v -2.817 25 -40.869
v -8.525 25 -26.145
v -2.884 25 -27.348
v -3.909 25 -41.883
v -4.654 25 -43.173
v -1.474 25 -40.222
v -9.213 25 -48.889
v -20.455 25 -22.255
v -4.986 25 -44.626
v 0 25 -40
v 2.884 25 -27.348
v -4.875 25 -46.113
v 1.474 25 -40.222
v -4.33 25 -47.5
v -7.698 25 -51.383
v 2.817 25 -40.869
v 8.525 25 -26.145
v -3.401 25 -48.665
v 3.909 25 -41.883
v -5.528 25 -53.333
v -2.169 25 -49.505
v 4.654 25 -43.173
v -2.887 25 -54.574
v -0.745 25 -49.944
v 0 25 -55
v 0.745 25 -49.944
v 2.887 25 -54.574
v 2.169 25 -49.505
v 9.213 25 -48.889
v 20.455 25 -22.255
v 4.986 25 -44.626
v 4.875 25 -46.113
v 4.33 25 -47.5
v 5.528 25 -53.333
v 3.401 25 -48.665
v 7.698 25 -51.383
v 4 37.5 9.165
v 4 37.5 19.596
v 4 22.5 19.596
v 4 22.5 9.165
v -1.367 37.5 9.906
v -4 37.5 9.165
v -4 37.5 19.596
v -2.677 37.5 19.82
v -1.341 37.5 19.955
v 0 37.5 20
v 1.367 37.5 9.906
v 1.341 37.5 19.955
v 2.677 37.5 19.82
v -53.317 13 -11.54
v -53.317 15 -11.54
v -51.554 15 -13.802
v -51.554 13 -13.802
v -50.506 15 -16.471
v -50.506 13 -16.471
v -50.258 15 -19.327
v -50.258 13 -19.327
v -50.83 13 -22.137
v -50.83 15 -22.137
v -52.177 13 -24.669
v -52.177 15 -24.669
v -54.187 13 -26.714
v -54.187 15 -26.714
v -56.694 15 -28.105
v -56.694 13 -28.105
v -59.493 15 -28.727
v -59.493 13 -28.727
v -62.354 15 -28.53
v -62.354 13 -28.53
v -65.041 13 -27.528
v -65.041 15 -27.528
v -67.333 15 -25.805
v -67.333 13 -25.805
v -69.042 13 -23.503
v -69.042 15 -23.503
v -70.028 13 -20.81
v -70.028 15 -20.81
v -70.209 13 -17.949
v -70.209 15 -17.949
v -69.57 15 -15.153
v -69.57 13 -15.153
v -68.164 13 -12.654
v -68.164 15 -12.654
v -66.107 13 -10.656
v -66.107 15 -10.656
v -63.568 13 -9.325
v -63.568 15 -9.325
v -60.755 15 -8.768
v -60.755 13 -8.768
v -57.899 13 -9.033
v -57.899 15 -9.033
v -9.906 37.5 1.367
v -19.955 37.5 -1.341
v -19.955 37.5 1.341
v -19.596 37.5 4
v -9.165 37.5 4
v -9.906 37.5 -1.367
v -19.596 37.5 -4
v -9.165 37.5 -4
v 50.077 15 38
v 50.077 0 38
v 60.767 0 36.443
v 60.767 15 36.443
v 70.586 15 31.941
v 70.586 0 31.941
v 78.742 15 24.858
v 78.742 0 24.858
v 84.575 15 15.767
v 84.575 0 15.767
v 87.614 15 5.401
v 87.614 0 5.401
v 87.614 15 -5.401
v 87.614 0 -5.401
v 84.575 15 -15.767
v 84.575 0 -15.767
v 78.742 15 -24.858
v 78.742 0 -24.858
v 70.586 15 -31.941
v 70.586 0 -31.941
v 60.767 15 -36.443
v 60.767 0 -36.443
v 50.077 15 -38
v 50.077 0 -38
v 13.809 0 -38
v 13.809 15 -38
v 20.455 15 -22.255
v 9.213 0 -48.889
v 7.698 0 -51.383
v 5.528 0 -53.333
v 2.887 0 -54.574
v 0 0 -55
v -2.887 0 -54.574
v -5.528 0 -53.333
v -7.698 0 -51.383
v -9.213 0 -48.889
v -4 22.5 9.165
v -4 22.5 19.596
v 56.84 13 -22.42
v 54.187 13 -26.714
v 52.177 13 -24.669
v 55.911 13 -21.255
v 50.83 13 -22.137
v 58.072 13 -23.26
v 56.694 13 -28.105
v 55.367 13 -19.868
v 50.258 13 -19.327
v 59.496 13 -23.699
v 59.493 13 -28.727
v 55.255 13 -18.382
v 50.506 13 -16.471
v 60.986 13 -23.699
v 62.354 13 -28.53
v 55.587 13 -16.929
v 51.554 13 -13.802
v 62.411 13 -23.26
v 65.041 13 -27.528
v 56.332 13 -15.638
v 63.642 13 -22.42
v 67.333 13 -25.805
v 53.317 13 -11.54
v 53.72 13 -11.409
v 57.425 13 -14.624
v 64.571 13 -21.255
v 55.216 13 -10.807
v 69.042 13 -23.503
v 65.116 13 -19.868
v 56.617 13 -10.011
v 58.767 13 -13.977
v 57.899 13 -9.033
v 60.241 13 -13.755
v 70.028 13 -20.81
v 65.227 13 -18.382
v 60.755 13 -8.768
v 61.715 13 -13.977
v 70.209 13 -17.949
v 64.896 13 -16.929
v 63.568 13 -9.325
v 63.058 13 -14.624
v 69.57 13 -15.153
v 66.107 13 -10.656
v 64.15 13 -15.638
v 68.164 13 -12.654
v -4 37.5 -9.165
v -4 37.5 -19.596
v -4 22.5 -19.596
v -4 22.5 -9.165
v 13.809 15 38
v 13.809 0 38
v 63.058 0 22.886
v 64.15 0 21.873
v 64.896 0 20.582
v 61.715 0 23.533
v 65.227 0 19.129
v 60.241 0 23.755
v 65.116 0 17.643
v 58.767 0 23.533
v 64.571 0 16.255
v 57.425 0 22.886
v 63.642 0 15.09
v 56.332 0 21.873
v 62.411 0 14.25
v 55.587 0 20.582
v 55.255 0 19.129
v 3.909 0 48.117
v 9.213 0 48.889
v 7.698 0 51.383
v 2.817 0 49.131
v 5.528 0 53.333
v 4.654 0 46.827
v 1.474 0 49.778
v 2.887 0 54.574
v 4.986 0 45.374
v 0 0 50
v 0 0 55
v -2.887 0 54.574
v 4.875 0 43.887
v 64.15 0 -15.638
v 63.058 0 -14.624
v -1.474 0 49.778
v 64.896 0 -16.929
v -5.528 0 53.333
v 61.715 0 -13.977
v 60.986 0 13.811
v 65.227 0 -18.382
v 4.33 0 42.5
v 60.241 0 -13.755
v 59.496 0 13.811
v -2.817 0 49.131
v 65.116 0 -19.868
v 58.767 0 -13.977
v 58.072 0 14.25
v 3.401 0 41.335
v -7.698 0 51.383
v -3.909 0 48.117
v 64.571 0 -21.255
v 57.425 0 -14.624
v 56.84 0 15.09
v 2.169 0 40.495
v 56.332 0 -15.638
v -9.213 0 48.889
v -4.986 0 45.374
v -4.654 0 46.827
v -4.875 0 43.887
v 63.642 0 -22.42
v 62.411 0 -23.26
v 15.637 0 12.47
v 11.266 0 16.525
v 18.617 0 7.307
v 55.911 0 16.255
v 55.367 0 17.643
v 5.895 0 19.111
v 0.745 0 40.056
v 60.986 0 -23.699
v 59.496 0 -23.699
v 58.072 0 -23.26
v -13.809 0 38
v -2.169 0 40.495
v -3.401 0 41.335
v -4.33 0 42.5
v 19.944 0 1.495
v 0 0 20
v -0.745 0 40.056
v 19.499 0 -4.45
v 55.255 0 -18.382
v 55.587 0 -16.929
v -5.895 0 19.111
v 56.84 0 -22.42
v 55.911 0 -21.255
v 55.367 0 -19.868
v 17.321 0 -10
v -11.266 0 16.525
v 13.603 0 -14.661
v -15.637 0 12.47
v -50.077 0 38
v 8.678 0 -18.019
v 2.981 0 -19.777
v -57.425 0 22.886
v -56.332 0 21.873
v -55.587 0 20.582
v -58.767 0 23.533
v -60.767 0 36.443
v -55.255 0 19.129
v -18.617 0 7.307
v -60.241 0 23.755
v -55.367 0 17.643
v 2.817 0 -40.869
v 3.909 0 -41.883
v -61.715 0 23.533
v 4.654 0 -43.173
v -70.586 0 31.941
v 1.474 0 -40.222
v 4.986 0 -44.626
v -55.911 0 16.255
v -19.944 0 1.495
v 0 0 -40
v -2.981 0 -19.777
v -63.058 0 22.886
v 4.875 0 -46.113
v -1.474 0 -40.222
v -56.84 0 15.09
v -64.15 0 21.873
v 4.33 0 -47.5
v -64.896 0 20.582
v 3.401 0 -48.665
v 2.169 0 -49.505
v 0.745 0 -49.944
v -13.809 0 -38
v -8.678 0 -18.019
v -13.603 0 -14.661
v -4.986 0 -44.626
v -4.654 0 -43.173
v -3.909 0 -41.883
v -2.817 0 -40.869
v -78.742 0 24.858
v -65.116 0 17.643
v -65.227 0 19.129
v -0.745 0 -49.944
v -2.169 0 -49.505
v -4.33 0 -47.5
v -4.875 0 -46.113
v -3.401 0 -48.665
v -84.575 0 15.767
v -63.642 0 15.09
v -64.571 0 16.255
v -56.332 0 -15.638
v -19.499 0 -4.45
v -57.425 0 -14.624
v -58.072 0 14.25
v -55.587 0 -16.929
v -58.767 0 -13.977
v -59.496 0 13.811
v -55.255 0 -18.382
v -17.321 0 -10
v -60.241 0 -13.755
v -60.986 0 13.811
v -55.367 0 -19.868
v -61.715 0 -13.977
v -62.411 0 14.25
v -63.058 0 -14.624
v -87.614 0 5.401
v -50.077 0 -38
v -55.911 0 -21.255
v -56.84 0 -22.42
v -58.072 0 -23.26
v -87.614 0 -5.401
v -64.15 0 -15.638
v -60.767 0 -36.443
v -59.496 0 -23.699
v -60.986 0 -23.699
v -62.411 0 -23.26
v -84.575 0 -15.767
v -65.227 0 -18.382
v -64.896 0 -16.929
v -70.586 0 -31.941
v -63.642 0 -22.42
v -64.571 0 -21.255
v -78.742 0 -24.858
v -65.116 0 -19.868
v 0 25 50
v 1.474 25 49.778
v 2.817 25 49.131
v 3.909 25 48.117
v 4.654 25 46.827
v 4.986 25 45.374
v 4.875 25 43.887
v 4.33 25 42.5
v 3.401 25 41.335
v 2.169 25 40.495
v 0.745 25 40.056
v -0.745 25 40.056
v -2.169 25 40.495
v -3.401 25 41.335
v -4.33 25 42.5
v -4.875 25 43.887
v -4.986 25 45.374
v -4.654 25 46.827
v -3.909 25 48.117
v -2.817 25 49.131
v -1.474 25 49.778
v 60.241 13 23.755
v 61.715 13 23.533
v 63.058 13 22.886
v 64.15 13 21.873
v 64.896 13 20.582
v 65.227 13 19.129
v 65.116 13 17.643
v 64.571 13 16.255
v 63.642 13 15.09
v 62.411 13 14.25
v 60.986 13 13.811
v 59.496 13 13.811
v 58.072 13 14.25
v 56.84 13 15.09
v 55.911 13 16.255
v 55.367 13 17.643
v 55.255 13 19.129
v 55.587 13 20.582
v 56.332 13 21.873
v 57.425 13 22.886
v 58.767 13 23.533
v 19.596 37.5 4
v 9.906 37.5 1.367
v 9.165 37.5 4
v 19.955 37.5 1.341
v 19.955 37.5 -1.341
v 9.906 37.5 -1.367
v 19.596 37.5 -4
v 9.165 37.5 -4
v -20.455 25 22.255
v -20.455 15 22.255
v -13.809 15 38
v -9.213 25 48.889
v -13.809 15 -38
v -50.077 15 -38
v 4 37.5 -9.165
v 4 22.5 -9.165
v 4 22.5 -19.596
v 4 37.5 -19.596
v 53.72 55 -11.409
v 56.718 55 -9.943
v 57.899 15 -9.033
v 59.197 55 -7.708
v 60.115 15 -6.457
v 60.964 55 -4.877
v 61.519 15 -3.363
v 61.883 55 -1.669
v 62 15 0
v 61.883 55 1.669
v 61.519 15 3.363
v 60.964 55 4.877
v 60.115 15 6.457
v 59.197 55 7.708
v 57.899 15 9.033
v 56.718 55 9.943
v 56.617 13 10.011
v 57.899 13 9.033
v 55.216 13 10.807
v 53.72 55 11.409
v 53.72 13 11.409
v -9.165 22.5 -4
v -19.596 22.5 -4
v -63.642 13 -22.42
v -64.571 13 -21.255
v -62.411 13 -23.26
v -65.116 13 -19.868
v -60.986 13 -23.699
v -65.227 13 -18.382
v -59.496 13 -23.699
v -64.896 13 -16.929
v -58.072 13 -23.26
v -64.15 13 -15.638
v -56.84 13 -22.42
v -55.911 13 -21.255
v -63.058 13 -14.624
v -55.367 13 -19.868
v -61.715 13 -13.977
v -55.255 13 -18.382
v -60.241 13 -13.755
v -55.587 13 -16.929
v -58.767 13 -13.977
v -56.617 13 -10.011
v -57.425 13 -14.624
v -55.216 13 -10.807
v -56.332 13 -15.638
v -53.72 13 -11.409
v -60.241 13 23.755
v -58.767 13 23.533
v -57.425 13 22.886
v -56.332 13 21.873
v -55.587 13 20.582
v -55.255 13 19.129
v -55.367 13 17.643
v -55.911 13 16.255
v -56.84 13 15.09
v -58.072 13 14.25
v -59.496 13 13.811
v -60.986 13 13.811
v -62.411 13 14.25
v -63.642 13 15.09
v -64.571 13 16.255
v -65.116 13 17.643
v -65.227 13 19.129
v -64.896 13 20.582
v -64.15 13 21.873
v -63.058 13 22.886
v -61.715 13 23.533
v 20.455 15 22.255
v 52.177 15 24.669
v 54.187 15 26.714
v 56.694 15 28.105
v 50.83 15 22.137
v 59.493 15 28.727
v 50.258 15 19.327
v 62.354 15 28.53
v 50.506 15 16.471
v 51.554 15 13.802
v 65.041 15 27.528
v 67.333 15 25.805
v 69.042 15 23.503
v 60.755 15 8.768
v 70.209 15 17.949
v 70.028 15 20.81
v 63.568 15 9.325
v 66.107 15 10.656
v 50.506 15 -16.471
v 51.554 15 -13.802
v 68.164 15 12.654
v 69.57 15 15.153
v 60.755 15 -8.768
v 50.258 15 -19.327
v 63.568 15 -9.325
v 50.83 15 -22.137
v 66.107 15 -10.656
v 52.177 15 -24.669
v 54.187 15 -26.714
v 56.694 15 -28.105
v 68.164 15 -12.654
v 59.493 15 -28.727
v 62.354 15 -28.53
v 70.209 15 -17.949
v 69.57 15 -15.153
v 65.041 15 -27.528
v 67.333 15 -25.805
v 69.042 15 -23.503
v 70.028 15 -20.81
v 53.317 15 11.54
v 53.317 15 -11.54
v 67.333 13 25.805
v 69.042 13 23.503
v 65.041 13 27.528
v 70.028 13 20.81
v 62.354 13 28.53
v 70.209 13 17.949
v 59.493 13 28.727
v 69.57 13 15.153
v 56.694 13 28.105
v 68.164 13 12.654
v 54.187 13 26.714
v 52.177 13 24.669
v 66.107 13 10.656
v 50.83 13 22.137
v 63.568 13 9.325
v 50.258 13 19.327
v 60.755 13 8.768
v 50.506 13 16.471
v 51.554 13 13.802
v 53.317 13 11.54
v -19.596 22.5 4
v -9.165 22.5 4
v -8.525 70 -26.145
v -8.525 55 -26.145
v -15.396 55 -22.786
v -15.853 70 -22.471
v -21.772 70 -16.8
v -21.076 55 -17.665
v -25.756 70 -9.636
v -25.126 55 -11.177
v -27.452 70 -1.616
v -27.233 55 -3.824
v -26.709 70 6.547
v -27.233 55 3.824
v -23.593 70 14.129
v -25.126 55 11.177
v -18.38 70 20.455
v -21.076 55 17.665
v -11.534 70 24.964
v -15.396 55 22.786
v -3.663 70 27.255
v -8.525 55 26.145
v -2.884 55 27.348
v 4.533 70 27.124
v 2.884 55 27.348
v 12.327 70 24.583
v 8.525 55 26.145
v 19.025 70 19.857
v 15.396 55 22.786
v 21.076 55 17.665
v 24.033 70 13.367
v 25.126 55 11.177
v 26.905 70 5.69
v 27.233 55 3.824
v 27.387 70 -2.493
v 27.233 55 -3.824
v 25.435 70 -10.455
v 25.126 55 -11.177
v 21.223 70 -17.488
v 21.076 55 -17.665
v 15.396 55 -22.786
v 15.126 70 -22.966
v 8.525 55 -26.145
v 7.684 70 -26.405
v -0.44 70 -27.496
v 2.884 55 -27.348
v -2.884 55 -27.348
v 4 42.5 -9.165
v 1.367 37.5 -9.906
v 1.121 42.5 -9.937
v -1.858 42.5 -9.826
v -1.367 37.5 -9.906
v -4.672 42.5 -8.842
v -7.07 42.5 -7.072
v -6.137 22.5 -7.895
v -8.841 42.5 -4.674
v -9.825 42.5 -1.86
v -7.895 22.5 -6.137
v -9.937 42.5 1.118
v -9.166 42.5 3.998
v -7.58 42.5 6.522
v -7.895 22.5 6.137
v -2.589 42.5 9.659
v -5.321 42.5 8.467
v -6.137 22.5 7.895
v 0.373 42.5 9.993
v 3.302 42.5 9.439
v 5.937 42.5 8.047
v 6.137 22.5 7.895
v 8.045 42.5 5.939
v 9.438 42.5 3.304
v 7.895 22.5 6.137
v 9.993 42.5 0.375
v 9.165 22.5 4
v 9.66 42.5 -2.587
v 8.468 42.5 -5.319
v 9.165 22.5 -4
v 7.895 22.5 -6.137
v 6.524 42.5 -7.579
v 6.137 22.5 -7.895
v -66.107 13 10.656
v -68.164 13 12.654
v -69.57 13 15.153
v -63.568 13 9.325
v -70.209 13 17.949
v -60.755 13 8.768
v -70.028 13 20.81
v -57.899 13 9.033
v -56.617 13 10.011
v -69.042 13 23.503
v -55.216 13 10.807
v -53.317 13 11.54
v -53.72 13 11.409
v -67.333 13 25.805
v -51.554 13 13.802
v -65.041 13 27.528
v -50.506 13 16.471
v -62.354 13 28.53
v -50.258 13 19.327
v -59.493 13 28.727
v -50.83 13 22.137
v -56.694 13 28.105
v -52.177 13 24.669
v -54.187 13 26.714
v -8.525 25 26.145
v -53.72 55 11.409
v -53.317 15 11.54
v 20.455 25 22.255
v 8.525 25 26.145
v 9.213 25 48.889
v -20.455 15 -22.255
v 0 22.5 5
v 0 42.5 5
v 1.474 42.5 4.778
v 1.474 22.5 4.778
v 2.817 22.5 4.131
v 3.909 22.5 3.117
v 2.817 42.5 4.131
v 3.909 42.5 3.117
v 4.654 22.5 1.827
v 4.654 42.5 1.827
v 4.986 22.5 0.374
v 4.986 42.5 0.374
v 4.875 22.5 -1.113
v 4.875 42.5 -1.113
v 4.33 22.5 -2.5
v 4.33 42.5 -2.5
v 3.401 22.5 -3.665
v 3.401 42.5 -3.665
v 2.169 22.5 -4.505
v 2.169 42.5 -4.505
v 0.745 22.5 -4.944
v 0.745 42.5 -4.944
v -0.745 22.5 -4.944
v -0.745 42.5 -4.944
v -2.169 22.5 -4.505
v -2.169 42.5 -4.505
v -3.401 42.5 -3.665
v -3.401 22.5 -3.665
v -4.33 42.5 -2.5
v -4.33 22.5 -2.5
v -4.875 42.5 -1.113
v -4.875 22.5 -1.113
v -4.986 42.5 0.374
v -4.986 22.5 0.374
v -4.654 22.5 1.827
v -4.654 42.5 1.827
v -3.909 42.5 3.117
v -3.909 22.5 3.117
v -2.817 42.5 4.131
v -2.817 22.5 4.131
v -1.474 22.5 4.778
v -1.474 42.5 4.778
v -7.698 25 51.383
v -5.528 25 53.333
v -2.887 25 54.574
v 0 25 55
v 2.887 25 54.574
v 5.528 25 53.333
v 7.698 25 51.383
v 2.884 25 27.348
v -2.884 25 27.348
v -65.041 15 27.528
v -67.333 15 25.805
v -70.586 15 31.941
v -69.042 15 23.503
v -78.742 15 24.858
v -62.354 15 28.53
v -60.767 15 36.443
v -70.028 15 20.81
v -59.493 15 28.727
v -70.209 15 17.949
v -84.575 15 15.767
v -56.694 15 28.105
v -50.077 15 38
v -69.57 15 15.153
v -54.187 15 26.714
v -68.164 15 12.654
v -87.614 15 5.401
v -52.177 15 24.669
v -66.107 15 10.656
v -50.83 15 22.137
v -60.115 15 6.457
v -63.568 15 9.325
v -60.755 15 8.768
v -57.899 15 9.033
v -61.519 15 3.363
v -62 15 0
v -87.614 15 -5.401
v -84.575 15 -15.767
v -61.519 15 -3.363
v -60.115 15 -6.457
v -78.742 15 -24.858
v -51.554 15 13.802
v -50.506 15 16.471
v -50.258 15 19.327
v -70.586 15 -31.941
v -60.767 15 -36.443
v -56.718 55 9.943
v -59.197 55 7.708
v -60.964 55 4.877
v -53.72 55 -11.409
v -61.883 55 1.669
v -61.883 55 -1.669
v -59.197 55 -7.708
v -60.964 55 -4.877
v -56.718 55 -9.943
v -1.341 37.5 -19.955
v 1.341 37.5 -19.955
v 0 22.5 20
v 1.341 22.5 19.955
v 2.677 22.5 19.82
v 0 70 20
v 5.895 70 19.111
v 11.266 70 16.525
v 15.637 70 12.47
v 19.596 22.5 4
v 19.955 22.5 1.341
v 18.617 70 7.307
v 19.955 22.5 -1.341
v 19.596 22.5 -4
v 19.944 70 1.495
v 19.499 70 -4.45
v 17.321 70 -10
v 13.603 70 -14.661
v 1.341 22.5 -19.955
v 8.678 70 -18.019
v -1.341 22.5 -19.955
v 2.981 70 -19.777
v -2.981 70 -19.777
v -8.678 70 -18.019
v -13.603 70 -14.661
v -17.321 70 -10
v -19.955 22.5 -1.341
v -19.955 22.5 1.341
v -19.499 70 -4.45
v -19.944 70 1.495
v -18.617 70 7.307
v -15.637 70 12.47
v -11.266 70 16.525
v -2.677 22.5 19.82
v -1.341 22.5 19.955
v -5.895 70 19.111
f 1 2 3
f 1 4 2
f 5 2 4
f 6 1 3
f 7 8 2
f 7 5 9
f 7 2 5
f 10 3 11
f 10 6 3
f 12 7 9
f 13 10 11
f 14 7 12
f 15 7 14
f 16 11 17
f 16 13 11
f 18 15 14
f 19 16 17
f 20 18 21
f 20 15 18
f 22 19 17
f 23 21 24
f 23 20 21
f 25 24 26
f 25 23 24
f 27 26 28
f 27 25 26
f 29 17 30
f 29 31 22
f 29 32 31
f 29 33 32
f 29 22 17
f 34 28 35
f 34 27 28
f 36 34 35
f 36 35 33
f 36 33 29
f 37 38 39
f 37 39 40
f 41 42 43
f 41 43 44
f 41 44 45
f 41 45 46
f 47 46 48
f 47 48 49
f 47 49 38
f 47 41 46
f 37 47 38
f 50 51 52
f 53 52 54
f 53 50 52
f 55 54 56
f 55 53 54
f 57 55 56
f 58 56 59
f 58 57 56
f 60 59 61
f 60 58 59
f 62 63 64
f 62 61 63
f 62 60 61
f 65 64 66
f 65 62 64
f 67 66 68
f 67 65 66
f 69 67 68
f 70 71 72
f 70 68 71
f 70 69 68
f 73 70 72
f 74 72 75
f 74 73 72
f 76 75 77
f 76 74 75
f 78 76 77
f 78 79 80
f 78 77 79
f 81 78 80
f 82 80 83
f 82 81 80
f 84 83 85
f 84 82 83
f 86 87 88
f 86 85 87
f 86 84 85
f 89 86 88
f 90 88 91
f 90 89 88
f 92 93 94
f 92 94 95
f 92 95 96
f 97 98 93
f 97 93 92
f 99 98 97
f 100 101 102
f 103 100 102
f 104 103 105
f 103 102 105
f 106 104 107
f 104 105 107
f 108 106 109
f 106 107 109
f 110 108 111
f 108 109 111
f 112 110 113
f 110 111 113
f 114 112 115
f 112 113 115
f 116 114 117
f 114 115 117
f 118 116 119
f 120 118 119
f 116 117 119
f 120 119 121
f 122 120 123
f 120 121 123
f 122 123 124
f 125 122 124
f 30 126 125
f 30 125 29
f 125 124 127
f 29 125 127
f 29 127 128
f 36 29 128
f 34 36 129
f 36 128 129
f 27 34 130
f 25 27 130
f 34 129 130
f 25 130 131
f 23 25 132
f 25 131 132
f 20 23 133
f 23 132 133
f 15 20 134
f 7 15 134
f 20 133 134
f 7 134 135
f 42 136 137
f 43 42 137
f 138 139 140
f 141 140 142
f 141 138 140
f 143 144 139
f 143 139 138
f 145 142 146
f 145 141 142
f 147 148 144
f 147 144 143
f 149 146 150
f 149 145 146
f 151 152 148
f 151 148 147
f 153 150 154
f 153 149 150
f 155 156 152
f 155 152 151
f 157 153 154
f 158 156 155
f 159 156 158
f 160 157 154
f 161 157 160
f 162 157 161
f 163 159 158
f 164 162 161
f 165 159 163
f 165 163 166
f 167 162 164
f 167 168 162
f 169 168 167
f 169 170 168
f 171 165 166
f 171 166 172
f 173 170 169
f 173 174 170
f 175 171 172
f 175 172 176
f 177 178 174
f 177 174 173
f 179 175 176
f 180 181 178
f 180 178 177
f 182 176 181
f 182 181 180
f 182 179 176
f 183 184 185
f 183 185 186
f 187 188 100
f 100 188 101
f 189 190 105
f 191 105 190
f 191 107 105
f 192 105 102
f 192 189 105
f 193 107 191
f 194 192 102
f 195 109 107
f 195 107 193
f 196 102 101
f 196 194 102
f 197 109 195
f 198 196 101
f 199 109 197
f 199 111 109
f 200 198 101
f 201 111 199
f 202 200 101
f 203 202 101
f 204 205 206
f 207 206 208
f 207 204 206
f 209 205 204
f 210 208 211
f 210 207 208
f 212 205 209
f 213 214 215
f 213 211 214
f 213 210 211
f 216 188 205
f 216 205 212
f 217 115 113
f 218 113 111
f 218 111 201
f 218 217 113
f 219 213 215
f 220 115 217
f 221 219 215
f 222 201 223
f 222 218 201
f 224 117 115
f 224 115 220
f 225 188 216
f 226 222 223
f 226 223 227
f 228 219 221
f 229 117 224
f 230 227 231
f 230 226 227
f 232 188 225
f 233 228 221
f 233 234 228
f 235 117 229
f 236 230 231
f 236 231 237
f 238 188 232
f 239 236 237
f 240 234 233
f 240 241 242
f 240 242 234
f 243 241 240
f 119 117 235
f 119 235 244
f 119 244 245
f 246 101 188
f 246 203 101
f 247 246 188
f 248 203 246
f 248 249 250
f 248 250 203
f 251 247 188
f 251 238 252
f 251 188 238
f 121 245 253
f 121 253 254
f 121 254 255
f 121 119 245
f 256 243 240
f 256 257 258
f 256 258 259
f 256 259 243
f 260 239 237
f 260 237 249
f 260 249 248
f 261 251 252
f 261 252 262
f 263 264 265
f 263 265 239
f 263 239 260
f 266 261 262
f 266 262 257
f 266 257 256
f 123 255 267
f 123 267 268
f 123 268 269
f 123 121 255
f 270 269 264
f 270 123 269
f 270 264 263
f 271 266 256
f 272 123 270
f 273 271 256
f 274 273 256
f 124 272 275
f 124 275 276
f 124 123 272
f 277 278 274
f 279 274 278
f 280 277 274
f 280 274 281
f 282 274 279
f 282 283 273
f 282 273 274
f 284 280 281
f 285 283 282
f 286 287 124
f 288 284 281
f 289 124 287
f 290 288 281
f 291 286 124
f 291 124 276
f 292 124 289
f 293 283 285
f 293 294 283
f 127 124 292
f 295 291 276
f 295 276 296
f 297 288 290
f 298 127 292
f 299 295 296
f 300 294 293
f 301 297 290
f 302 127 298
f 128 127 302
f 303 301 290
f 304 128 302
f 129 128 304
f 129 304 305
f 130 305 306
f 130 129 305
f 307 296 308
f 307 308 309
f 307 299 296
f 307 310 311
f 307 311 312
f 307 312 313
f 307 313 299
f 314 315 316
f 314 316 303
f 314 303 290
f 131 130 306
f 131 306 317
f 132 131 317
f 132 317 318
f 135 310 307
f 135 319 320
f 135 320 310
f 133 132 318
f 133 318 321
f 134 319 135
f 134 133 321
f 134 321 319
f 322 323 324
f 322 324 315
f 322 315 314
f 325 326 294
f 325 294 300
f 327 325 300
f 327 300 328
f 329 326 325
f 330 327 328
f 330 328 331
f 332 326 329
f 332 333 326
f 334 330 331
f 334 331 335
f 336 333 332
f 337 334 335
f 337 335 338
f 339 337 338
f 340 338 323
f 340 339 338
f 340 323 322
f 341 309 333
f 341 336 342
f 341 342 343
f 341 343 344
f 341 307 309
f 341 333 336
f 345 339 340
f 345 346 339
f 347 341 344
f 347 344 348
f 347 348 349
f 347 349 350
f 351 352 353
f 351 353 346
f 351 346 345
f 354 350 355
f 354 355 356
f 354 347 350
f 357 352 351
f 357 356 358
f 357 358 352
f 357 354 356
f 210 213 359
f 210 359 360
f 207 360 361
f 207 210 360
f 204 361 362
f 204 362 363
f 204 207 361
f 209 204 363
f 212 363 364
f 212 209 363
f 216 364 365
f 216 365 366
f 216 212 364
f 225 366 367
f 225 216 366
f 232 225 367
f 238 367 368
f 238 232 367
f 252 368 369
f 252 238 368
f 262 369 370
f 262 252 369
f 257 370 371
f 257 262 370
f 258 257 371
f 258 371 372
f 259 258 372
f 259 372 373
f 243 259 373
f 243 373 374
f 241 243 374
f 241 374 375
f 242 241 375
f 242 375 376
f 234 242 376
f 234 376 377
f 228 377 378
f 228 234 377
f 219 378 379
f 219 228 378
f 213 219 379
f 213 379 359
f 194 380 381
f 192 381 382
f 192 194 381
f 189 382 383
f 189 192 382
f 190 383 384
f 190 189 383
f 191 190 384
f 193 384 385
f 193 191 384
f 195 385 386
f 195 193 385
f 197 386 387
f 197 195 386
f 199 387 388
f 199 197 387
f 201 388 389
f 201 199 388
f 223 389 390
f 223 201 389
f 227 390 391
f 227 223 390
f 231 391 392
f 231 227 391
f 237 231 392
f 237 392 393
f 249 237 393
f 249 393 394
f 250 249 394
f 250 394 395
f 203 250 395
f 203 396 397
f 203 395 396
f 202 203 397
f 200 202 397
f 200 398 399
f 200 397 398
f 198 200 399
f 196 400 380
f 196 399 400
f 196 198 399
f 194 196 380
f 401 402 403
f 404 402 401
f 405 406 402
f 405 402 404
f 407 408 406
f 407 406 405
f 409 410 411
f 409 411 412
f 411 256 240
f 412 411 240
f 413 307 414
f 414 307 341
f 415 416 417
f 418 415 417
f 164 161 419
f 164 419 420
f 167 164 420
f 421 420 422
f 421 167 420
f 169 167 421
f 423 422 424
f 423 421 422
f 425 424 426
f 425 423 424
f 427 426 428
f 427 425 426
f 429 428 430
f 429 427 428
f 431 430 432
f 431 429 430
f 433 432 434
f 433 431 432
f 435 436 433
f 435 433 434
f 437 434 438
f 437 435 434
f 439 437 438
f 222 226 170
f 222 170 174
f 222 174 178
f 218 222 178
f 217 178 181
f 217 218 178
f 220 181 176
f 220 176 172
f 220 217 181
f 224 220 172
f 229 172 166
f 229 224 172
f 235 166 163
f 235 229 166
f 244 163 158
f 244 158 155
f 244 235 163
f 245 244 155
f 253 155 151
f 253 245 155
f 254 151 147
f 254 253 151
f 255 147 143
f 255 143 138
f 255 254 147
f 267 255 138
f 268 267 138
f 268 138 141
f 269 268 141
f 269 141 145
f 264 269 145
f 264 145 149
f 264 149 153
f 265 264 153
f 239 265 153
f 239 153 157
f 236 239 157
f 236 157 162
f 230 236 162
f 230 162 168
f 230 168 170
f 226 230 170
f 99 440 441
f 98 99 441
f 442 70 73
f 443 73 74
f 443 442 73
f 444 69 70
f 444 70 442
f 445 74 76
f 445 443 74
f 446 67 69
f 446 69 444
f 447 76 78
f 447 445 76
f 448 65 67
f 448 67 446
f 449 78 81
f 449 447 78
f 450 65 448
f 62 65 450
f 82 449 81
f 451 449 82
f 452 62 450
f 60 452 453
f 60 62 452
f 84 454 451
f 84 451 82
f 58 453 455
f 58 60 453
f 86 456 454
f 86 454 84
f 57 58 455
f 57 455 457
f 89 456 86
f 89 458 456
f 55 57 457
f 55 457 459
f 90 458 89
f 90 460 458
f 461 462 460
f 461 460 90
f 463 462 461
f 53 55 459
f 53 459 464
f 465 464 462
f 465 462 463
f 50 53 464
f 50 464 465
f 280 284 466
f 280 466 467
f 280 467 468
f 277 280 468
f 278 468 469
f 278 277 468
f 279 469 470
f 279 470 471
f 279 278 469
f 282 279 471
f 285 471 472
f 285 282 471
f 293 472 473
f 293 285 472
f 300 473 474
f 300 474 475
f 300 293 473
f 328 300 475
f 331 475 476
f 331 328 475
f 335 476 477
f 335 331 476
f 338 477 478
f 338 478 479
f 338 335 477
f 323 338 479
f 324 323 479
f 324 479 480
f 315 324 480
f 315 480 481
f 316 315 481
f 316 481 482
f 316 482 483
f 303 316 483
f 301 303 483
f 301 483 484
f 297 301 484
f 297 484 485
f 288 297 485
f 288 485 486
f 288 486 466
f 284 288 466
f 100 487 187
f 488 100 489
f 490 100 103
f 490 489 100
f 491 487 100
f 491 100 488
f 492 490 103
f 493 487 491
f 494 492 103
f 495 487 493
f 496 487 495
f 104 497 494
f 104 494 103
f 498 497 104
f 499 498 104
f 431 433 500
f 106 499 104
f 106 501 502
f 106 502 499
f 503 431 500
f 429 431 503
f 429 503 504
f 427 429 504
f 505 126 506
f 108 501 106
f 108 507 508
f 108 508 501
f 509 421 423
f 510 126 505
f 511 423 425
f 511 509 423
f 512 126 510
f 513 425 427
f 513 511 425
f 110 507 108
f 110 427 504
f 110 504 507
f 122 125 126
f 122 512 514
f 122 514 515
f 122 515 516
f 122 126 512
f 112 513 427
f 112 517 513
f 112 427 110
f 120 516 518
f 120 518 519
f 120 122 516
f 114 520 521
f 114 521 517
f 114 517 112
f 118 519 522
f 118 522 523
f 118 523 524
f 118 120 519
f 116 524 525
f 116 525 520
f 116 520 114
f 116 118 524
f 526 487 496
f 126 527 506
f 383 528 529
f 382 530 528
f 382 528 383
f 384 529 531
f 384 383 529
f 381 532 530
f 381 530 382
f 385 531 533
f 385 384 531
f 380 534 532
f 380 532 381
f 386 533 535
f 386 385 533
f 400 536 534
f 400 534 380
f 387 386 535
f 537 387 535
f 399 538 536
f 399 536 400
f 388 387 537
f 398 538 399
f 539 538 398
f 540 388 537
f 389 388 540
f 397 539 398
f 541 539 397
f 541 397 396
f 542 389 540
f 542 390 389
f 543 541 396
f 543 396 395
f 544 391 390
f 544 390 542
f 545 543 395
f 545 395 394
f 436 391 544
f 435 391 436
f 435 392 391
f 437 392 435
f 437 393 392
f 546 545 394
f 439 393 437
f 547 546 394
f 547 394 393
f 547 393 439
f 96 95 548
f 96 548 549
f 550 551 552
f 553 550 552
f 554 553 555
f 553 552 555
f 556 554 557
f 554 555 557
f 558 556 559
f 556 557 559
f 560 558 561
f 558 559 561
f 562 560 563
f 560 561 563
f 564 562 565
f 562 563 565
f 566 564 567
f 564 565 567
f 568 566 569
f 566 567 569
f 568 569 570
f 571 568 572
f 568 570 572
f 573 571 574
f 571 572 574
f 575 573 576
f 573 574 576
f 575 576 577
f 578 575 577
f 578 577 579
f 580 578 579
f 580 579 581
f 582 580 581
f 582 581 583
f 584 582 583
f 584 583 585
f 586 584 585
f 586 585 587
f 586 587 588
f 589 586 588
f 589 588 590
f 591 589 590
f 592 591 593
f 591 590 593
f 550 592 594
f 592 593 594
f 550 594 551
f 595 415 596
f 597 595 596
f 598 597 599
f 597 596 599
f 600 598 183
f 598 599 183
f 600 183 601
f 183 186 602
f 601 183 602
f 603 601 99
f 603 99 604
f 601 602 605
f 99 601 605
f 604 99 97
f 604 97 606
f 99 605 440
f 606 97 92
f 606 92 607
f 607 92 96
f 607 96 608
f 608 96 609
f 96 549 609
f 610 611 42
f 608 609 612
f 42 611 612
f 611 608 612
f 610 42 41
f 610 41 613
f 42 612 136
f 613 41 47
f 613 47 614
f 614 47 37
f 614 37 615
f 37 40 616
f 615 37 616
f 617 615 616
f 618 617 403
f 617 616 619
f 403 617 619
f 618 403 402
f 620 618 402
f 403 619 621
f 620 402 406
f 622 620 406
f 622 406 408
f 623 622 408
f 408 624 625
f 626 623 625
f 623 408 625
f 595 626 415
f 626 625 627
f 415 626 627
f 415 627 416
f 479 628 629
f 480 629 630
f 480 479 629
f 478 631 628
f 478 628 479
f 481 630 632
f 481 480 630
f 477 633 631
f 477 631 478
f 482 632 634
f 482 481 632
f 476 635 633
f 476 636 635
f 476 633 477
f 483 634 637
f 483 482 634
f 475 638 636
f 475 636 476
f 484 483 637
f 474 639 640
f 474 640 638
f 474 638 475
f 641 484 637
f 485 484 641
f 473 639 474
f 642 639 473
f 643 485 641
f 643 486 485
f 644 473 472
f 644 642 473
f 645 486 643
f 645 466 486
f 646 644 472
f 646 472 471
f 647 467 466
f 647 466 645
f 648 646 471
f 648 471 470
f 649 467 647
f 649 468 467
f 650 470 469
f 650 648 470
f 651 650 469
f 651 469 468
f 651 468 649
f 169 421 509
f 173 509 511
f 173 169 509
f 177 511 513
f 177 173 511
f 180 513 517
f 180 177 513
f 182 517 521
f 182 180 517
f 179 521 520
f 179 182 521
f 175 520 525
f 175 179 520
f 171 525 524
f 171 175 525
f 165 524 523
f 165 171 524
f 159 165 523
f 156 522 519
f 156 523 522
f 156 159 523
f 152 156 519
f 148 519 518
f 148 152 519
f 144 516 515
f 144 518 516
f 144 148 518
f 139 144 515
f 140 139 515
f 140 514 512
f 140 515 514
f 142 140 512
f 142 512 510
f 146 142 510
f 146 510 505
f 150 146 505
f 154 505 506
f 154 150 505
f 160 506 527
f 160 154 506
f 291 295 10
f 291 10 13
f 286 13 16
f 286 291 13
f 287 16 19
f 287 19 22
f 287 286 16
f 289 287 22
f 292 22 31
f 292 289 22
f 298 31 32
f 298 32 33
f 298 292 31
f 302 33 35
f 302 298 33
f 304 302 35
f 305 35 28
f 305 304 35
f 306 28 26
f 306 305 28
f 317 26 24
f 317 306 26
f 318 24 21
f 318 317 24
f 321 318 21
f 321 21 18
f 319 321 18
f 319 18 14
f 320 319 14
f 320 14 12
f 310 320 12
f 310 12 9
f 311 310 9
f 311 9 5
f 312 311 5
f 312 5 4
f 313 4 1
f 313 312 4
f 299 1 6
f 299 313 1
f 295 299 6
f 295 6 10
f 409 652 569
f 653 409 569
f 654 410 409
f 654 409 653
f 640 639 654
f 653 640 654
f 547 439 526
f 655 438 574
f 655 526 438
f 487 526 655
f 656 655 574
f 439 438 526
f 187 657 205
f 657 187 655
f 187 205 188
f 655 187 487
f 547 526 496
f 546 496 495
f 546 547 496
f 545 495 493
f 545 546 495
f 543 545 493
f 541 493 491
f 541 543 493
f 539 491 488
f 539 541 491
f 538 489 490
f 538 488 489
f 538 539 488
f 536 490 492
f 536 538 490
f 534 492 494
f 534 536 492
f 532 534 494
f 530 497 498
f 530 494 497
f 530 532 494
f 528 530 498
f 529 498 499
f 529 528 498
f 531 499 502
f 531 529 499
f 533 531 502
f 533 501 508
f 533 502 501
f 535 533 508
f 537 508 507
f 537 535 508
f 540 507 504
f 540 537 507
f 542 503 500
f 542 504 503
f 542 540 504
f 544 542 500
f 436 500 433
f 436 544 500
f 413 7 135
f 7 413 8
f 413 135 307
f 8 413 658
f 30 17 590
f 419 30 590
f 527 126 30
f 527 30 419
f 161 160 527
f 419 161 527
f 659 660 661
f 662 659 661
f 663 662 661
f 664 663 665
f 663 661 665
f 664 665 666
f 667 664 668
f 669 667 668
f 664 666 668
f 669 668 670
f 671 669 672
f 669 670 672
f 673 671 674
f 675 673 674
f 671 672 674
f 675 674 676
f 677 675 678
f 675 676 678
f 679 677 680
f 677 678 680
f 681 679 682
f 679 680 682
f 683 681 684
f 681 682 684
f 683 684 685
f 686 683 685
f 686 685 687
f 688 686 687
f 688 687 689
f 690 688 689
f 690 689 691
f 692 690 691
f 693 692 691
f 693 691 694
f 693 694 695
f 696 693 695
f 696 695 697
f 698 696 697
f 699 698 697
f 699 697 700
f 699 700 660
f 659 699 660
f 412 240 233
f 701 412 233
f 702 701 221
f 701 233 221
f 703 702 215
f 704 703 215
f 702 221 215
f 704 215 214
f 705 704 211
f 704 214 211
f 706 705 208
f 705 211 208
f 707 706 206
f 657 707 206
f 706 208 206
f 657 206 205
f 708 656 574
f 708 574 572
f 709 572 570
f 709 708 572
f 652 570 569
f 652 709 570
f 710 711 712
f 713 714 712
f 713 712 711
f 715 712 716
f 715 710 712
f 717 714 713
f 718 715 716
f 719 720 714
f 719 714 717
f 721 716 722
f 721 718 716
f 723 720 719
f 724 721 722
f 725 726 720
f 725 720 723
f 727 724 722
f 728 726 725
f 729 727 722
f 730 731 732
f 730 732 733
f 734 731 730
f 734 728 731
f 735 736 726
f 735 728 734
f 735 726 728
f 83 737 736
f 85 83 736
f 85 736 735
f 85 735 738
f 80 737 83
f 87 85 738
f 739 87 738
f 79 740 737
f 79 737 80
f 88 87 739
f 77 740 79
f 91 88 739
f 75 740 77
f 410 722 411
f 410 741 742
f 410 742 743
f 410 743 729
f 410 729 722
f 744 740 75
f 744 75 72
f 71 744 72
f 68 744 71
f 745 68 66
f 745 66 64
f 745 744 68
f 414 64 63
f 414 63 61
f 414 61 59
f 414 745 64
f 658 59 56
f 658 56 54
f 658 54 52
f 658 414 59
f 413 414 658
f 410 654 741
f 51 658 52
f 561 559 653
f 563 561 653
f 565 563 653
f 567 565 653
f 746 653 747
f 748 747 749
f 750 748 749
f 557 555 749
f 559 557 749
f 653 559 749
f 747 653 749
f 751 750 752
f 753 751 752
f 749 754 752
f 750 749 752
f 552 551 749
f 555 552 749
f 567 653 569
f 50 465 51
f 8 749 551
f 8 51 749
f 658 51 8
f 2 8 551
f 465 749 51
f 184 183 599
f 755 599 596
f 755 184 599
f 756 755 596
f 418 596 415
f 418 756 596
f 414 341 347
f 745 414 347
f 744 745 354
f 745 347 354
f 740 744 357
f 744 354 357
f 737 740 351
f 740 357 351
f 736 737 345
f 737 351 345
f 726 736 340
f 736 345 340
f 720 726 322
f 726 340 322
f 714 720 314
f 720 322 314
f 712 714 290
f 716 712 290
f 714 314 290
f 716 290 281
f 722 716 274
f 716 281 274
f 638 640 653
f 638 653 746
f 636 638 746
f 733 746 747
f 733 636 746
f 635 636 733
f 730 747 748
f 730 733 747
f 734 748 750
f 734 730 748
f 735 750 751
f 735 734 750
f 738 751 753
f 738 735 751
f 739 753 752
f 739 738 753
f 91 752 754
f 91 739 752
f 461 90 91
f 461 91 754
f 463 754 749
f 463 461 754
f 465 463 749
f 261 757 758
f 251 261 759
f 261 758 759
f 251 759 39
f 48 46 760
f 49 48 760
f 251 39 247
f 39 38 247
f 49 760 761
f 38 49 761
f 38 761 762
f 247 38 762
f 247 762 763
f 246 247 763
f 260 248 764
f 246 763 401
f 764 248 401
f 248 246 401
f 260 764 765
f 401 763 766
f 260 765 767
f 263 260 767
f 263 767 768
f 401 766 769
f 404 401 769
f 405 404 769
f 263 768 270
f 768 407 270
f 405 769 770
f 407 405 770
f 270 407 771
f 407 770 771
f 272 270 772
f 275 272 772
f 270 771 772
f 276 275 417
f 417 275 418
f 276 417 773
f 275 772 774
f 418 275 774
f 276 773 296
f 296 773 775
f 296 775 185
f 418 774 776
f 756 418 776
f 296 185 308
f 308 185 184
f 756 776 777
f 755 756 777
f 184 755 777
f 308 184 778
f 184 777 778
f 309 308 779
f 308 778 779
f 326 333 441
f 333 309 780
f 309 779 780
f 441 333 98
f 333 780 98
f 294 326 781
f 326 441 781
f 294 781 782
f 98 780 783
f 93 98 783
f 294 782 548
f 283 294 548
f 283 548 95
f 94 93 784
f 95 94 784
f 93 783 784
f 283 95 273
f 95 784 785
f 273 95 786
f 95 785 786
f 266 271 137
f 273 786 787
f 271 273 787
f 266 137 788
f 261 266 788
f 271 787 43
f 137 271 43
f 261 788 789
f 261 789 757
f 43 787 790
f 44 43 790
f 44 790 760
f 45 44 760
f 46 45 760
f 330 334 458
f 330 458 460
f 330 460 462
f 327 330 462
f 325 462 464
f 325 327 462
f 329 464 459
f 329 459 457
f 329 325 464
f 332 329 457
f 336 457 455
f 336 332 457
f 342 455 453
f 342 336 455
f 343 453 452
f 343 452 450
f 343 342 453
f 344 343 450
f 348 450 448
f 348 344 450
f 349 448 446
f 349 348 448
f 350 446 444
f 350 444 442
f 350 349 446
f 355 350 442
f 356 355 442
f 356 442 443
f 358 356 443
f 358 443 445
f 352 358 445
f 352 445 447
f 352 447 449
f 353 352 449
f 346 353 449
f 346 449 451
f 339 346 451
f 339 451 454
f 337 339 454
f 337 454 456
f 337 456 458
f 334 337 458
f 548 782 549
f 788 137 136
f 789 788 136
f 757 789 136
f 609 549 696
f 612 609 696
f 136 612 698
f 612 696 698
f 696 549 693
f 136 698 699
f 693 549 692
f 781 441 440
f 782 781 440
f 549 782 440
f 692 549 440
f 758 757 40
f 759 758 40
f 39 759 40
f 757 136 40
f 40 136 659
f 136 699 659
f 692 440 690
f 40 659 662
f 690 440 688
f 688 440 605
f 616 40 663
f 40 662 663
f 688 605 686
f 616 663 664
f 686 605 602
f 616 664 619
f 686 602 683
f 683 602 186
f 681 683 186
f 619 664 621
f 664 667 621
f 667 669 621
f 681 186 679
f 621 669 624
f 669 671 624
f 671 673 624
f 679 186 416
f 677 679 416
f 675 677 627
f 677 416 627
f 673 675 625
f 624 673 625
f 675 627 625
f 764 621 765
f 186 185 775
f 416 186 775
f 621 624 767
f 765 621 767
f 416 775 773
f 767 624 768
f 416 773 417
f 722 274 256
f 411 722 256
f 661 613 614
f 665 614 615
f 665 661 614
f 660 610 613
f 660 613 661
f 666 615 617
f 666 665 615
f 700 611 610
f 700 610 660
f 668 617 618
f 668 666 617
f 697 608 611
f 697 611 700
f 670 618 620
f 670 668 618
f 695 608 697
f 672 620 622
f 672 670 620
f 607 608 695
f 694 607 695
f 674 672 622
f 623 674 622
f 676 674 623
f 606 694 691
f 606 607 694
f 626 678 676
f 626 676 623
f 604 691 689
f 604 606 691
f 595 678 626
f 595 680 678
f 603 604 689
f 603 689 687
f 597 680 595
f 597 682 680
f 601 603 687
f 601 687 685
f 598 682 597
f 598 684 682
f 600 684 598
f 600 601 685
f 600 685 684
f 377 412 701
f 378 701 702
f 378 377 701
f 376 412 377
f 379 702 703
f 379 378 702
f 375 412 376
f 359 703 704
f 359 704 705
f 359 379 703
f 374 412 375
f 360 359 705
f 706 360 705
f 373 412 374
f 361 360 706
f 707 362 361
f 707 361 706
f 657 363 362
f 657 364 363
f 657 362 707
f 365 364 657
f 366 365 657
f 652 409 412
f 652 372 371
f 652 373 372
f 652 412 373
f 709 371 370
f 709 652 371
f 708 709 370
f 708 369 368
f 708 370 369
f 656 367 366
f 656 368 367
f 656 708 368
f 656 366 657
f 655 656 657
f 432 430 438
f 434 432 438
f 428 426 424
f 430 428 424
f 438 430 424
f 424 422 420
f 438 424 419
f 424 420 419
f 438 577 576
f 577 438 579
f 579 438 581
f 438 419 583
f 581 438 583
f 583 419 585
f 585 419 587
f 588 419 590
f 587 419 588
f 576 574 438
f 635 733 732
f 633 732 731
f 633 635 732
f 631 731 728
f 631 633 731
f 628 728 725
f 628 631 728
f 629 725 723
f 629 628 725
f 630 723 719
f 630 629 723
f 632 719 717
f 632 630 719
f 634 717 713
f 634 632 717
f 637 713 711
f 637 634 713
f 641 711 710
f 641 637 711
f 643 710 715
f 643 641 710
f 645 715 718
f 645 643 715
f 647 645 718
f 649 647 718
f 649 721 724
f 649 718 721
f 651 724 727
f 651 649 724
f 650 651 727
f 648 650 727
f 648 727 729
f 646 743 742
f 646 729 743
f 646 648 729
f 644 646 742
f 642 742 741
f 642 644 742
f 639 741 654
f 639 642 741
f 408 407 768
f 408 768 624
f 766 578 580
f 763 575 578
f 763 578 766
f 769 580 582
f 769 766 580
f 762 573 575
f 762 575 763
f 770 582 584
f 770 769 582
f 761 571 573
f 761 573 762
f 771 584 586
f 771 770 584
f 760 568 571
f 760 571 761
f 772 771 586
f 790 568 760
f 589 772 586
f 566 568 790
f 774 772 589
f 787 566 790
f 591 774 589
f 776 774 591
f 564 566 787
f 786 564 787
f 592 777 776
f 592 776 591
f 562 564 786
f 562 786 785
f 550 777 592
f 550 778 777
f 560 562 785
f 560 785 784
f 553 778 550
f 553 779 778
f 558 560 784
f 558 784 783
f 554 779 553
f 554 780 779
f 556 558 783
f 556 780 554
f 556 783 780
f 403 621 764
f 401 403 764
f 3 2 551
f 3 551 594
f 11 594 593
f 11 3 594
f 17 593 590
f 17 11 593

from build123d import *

# Parameters (mm, degrees)
SKETCH1_R           = 5
BOSS_EXTRUDE2_DEPTH = 15
CUT_EXTRUDE1_START  = -2
SKETCH2_R           = 10
SKETCH2_R_2         = 5
CUT_EXTRUDE1_DEPTH  = 2
BOSS_EXTRUDE3_START = -15
SKETCH3_R           = 5
BOSS_EXTRUDE3_DEPTH = 25
BOSS_EXTRUDE4_DEPTH = 55
SKETCH5_R           = 27.5
BOSS_EXTRUDE5_DEPTH = 15
SKETCH6_R           = 20
CUT_EXTRUDE2_DEPTH  = 126.175931669
EXTRUDE_THIN1_START = 22.5
EXTRUDE_THIN1_DEPTH = 15
BOSS_EXTRUDE6_START = -15
SKETCH8_R           = 10
BOSS_EXTRUDE6_DEPTH = 20
SKETCH9_R           = 5
CUT_EXTRUDE3_DEPTH  = 113.139483989


with BuildPart() as part:
    # Sketch1 → Boss-Extrude2 (new body)
    with BuildSketch(Plane(origin=(0, 0, 0), x_dir=(1, 0, 0), z_dir=(0, 1, 0))):
        with BuildLine():
            Line((-50.077388597, -38), (50.077388597, -38))
            ThreePointArc((50.077388597, -38), (88.000078802, 0), (50.077388597, 38))
            Line((50.077388597, 38), (-50.077388597, 38))
            ThreePointArc((-50.077388597, 38), (-88.000078802, 0), (-50.077388597, -38))
        make_face()
        with Locations(Location((-60.241162363, 18.755220238, 0), (0, 0, 270))):
            Circle(SKETCH1_R, mode=Mode.SUBTRACT)
        with Locations(Location((-60.241162363, -18.755220238, 0), (0, 0, 270))):
            Circle(SKETCH1_R, mode=Mode.SUBTRACT)
        with Locations(Location((60.241162363, -18.755220238, 0), (0, 0, 270))):
            Circle(SKETCH1_R, mode=Mode.SUBTRACT)
        with Locations(Location((60.241162363, 18.755220238, 0), (0, 0, 270))):
            Circle(SKETCH1_R, mode=Mode.SUBTRACT)
    extrude(amount=BOSS_EXTRUDE2_DEPTH)

    # Sketch2 → Cut-Extrude1 (cut)
    # profile 1 of 4: a face of its own
    with BuildSketch(Plane(origin=(0, 15, 0), x_dir=(1, 0, 0), z_dir=(0, 1, 0)).offset(CUT_EXTRUDE1_START)):
        with Locations(Location((-60.241162363, -18.755220238, 0), (0, 0, 270))):
            Circle(SKETCH2_R)
        with Locations(Location((-60.241162363, -18.755220238, 0), (0, 0, 270))):
            Circle(SKETCH2_R_2, mode=Mode.SUBTRACT)
    # profile 2 of 4: a face of its own
    with BuildSketch(Plane(origin=(0, 15, 0), x_dir=(1, 0, 0), z_dir=(0, 1, 0)).offset(CUT_EXTRUDE1_START)):
        with Locations(Location((-60.241162363, 18.755220238, 0), (0, 0, 270))):
            Circle(SKETCH2_R)
        with Locations(Location((-60.241162363, 18.755220238, 0), (0, 0, 270))):
            Circle(SKETCH2_R_2, mode=Mode.SUBTRACT)
    # profile 3 of 4: a face of its own
    with BuildSketch(Plane(origin=(0, 15, 0), x_dir=(1, 0, 0), z_dir=(0, 1, 0)).offset(CUT_EXTRUDE1_START)):
        with Locations(Location((60.241162363, 18.755220238, 0), (0, 0, 270))):
            Circle(SKETCH2_R)
        with Locations(Location((60.241162363, 18.755220238, 0), (0, 0, 270))):
            Circle(SKETCH2_R_2, mode=Mode.SUBTRACT)
    # profile 4 of 4: a face of its own
    with BuildSketch(Plane(origin=(0, 15, 0), x_dir=(1, 0, 0), z_dir=(0, 1, 0)).offset(CUT_EXTRUDE1_START)):
        with Locations(Location((60.241162363, -18.755220238, 0), (0, 0, 90))):
            Circle(SKETCH2_R)
    extrude(amount=CUT_EXTRUDE1_DEPTH, mode=Mode.SUBTRACT)

    # Sketch3 → Boss-Extrude3 (add)
    with BuildSketch(Plane(origin=(0, 15, 0), x_dir=(1, 0, 0), z_dir=(0, 1, 0)).offset(BOSS_EXTRUDE3_START)):
        with BuildLine():
            Line((-9.21284664, 48.888888889), (-25.33532826, 10.694444444))
            ThreePointArc((-25.33532826, 10.694444444), (-27.5, 0), (-25.33532826, -10.694444444))
            Line((-25.33532826, -10.694444444), (-9.21284664, -48.888888889))
            ThreePointArc((-9.21284664, -48.888888889), (0, -55), (9.21284664, -48.888888889))
            Line((9.21284664, -48.888888889), (25.33532826, -10.694444444))
            ThreePointArc((25.33532826, -10.694444444), (27.5, 0), (25.33532826, 10.694444444))
            Line((25.33532826, 10.694444444), (9.21284664, 48.888888889))
            ThreePointArc((9.21284664, 48.888888889), (0, 55), (-9.21284664, 48.888888889))
        make_face()
        with Locations(Location((0, 45, 0), (0, 0, 270))):
            Circle(SKETCH3_R, mode=Mode.SUBTRACT)
        with Locations(Location((0, -45, 0), (0, 0, 270))):
            Circle(SKETCH3_R, mode=Mode.SUBTRACT)
    extrude(amount=BOSS_EXTRUDE3_DEPTH)

    # Sketch4 → Boss-Extrude4 (add)
    with BuildSketch(Plane(origin=(0, 0, 0), x_dir=(1, 0, 0), z_dir=(0, 1, 0))):
        with BuildLine():
            Line((-53.72, 11.408838679), (-8.525, 26.145255306))
            ThreePointArc((-8.525, 26.145255306), (0, 27.5), (8.525, 26.145255306))
            Line((8.525, 26.145255306), (53.72, 11.408838679))
            ThreePointArc((53.72, 11.408838679), (62, 0), (53.72, -11.408838679))
            Line((53.72, -11.408838679), (8.525, -26.145255306))
            ThreePointArc((8.525, -26.145255306), (0, -27.5), (-8.525, -26.145255306))
            Line((-8.525, -26.145255306), (-53.72, -11.408838679))
            ThreePointArc((-53.72, -11.408838679), (-62, 0), (-53.72, 11.408838679))
        make_face()
    extrude(amount=BOSS_EXTRUDE4_DEPTH)

    # Sketch5 → Boss-Extrude5 (add)
    with BuildSketch(Plane(origin=(0, 55, 0), x_dir=(1, 0, 0), z_dir=(0, 1, 0))):
        with Locations(Location((0, 0, 0), (0, 0, 108.059230491))):
            Circle(SKETCH5_R)
    extrude(amount=BOSS_EXTRUDE5_DEPTH)

    # Sketch6 → Cut-Extrude2 (cut, through all)
    with BuildSketch(Plane(origin=(0, 70, 0), x_dir=(1, 0, 0), z_dir=(0, 1, 0))):
        with Locations(Location((0, 0, 0), (0, 0, 270))):
            Circle(SKETCH6_R)
    extrude(amount=-CUT_EXTRUDE2_DEPTH, mode=Mode.SUBTRACT)

    # Extrude-Thin1: read off the stored shape, not the designer's step
    # Extrude-Thin1 outline → Extrude-Thin1 (add)
    with BuildSketch(Plane(origin=(0, 0, 0), x_dir=(1, 0, 0), z_dir=(0, 1, 0)).offset(EXTRUDE_THIN1_START)):
        with BuildLine():
            Line((4, 4), (4, 19.595917942))
            ThreePointArc((4, 19.595917942), (0, 20), (-4, 19.595917942))
            Line((-4, 19.595917942), (-4, 4))
            Line((-4, 4), (-19.595917942, 4))
            ThreePointArc((-19.595917942, 4), (-20, 0), (-19.595917942, -4))
            Line((-19.595917942, -4), (-4, -4))
            Line((-4, -4), (-4, -19.595917942))
            ThreePointArc((-4, -19.595917942), (0, -20), (4, -19.595917942))
            Line((4, -19.595917942), (4, -4))
            Line((4, -4), (19.595917942, -4))
            ThreePointArc((19.595917942, -4), (20, 0), (19.595917942, 4))
            Line((19.595917942, 4), (4, 4))
        make_face()
    extrude(amount=EXTRUDE_THIN1_DEPTH)

    # Sketch8 → Boss-Extrude6 (add)
    with BuildSketch(Plane(origin=(0, 37.5, 0), x_dir=(1, 0, 0), z_dir=(0, 1, 0)).offset(BOSS_EXTRUDE6_START)):
        with Locations(Location((0, 0, 0), (0, 0, 66.421821522))):
            Circle(SKETCH8_R)
    extrude(amount=BOSS_EXTRUDE6_DEPTH)

    # Sketch9 → Cut-Extrude3 (cut, through all)
    with BuildSketch(Plane(origin=(0, 42.5, 0), x_dir=(1, 0, 0), z_dir=(0, 1, 0))):
        with Locations(Location((0, 0, 0), (0, 0, 270))):
            Circle(SKETCH9_R)
    extrude(amount=-CUT_EXTRUDE3_DEPTH, mode=Mode.SUBTRACT)


solid = part.part
